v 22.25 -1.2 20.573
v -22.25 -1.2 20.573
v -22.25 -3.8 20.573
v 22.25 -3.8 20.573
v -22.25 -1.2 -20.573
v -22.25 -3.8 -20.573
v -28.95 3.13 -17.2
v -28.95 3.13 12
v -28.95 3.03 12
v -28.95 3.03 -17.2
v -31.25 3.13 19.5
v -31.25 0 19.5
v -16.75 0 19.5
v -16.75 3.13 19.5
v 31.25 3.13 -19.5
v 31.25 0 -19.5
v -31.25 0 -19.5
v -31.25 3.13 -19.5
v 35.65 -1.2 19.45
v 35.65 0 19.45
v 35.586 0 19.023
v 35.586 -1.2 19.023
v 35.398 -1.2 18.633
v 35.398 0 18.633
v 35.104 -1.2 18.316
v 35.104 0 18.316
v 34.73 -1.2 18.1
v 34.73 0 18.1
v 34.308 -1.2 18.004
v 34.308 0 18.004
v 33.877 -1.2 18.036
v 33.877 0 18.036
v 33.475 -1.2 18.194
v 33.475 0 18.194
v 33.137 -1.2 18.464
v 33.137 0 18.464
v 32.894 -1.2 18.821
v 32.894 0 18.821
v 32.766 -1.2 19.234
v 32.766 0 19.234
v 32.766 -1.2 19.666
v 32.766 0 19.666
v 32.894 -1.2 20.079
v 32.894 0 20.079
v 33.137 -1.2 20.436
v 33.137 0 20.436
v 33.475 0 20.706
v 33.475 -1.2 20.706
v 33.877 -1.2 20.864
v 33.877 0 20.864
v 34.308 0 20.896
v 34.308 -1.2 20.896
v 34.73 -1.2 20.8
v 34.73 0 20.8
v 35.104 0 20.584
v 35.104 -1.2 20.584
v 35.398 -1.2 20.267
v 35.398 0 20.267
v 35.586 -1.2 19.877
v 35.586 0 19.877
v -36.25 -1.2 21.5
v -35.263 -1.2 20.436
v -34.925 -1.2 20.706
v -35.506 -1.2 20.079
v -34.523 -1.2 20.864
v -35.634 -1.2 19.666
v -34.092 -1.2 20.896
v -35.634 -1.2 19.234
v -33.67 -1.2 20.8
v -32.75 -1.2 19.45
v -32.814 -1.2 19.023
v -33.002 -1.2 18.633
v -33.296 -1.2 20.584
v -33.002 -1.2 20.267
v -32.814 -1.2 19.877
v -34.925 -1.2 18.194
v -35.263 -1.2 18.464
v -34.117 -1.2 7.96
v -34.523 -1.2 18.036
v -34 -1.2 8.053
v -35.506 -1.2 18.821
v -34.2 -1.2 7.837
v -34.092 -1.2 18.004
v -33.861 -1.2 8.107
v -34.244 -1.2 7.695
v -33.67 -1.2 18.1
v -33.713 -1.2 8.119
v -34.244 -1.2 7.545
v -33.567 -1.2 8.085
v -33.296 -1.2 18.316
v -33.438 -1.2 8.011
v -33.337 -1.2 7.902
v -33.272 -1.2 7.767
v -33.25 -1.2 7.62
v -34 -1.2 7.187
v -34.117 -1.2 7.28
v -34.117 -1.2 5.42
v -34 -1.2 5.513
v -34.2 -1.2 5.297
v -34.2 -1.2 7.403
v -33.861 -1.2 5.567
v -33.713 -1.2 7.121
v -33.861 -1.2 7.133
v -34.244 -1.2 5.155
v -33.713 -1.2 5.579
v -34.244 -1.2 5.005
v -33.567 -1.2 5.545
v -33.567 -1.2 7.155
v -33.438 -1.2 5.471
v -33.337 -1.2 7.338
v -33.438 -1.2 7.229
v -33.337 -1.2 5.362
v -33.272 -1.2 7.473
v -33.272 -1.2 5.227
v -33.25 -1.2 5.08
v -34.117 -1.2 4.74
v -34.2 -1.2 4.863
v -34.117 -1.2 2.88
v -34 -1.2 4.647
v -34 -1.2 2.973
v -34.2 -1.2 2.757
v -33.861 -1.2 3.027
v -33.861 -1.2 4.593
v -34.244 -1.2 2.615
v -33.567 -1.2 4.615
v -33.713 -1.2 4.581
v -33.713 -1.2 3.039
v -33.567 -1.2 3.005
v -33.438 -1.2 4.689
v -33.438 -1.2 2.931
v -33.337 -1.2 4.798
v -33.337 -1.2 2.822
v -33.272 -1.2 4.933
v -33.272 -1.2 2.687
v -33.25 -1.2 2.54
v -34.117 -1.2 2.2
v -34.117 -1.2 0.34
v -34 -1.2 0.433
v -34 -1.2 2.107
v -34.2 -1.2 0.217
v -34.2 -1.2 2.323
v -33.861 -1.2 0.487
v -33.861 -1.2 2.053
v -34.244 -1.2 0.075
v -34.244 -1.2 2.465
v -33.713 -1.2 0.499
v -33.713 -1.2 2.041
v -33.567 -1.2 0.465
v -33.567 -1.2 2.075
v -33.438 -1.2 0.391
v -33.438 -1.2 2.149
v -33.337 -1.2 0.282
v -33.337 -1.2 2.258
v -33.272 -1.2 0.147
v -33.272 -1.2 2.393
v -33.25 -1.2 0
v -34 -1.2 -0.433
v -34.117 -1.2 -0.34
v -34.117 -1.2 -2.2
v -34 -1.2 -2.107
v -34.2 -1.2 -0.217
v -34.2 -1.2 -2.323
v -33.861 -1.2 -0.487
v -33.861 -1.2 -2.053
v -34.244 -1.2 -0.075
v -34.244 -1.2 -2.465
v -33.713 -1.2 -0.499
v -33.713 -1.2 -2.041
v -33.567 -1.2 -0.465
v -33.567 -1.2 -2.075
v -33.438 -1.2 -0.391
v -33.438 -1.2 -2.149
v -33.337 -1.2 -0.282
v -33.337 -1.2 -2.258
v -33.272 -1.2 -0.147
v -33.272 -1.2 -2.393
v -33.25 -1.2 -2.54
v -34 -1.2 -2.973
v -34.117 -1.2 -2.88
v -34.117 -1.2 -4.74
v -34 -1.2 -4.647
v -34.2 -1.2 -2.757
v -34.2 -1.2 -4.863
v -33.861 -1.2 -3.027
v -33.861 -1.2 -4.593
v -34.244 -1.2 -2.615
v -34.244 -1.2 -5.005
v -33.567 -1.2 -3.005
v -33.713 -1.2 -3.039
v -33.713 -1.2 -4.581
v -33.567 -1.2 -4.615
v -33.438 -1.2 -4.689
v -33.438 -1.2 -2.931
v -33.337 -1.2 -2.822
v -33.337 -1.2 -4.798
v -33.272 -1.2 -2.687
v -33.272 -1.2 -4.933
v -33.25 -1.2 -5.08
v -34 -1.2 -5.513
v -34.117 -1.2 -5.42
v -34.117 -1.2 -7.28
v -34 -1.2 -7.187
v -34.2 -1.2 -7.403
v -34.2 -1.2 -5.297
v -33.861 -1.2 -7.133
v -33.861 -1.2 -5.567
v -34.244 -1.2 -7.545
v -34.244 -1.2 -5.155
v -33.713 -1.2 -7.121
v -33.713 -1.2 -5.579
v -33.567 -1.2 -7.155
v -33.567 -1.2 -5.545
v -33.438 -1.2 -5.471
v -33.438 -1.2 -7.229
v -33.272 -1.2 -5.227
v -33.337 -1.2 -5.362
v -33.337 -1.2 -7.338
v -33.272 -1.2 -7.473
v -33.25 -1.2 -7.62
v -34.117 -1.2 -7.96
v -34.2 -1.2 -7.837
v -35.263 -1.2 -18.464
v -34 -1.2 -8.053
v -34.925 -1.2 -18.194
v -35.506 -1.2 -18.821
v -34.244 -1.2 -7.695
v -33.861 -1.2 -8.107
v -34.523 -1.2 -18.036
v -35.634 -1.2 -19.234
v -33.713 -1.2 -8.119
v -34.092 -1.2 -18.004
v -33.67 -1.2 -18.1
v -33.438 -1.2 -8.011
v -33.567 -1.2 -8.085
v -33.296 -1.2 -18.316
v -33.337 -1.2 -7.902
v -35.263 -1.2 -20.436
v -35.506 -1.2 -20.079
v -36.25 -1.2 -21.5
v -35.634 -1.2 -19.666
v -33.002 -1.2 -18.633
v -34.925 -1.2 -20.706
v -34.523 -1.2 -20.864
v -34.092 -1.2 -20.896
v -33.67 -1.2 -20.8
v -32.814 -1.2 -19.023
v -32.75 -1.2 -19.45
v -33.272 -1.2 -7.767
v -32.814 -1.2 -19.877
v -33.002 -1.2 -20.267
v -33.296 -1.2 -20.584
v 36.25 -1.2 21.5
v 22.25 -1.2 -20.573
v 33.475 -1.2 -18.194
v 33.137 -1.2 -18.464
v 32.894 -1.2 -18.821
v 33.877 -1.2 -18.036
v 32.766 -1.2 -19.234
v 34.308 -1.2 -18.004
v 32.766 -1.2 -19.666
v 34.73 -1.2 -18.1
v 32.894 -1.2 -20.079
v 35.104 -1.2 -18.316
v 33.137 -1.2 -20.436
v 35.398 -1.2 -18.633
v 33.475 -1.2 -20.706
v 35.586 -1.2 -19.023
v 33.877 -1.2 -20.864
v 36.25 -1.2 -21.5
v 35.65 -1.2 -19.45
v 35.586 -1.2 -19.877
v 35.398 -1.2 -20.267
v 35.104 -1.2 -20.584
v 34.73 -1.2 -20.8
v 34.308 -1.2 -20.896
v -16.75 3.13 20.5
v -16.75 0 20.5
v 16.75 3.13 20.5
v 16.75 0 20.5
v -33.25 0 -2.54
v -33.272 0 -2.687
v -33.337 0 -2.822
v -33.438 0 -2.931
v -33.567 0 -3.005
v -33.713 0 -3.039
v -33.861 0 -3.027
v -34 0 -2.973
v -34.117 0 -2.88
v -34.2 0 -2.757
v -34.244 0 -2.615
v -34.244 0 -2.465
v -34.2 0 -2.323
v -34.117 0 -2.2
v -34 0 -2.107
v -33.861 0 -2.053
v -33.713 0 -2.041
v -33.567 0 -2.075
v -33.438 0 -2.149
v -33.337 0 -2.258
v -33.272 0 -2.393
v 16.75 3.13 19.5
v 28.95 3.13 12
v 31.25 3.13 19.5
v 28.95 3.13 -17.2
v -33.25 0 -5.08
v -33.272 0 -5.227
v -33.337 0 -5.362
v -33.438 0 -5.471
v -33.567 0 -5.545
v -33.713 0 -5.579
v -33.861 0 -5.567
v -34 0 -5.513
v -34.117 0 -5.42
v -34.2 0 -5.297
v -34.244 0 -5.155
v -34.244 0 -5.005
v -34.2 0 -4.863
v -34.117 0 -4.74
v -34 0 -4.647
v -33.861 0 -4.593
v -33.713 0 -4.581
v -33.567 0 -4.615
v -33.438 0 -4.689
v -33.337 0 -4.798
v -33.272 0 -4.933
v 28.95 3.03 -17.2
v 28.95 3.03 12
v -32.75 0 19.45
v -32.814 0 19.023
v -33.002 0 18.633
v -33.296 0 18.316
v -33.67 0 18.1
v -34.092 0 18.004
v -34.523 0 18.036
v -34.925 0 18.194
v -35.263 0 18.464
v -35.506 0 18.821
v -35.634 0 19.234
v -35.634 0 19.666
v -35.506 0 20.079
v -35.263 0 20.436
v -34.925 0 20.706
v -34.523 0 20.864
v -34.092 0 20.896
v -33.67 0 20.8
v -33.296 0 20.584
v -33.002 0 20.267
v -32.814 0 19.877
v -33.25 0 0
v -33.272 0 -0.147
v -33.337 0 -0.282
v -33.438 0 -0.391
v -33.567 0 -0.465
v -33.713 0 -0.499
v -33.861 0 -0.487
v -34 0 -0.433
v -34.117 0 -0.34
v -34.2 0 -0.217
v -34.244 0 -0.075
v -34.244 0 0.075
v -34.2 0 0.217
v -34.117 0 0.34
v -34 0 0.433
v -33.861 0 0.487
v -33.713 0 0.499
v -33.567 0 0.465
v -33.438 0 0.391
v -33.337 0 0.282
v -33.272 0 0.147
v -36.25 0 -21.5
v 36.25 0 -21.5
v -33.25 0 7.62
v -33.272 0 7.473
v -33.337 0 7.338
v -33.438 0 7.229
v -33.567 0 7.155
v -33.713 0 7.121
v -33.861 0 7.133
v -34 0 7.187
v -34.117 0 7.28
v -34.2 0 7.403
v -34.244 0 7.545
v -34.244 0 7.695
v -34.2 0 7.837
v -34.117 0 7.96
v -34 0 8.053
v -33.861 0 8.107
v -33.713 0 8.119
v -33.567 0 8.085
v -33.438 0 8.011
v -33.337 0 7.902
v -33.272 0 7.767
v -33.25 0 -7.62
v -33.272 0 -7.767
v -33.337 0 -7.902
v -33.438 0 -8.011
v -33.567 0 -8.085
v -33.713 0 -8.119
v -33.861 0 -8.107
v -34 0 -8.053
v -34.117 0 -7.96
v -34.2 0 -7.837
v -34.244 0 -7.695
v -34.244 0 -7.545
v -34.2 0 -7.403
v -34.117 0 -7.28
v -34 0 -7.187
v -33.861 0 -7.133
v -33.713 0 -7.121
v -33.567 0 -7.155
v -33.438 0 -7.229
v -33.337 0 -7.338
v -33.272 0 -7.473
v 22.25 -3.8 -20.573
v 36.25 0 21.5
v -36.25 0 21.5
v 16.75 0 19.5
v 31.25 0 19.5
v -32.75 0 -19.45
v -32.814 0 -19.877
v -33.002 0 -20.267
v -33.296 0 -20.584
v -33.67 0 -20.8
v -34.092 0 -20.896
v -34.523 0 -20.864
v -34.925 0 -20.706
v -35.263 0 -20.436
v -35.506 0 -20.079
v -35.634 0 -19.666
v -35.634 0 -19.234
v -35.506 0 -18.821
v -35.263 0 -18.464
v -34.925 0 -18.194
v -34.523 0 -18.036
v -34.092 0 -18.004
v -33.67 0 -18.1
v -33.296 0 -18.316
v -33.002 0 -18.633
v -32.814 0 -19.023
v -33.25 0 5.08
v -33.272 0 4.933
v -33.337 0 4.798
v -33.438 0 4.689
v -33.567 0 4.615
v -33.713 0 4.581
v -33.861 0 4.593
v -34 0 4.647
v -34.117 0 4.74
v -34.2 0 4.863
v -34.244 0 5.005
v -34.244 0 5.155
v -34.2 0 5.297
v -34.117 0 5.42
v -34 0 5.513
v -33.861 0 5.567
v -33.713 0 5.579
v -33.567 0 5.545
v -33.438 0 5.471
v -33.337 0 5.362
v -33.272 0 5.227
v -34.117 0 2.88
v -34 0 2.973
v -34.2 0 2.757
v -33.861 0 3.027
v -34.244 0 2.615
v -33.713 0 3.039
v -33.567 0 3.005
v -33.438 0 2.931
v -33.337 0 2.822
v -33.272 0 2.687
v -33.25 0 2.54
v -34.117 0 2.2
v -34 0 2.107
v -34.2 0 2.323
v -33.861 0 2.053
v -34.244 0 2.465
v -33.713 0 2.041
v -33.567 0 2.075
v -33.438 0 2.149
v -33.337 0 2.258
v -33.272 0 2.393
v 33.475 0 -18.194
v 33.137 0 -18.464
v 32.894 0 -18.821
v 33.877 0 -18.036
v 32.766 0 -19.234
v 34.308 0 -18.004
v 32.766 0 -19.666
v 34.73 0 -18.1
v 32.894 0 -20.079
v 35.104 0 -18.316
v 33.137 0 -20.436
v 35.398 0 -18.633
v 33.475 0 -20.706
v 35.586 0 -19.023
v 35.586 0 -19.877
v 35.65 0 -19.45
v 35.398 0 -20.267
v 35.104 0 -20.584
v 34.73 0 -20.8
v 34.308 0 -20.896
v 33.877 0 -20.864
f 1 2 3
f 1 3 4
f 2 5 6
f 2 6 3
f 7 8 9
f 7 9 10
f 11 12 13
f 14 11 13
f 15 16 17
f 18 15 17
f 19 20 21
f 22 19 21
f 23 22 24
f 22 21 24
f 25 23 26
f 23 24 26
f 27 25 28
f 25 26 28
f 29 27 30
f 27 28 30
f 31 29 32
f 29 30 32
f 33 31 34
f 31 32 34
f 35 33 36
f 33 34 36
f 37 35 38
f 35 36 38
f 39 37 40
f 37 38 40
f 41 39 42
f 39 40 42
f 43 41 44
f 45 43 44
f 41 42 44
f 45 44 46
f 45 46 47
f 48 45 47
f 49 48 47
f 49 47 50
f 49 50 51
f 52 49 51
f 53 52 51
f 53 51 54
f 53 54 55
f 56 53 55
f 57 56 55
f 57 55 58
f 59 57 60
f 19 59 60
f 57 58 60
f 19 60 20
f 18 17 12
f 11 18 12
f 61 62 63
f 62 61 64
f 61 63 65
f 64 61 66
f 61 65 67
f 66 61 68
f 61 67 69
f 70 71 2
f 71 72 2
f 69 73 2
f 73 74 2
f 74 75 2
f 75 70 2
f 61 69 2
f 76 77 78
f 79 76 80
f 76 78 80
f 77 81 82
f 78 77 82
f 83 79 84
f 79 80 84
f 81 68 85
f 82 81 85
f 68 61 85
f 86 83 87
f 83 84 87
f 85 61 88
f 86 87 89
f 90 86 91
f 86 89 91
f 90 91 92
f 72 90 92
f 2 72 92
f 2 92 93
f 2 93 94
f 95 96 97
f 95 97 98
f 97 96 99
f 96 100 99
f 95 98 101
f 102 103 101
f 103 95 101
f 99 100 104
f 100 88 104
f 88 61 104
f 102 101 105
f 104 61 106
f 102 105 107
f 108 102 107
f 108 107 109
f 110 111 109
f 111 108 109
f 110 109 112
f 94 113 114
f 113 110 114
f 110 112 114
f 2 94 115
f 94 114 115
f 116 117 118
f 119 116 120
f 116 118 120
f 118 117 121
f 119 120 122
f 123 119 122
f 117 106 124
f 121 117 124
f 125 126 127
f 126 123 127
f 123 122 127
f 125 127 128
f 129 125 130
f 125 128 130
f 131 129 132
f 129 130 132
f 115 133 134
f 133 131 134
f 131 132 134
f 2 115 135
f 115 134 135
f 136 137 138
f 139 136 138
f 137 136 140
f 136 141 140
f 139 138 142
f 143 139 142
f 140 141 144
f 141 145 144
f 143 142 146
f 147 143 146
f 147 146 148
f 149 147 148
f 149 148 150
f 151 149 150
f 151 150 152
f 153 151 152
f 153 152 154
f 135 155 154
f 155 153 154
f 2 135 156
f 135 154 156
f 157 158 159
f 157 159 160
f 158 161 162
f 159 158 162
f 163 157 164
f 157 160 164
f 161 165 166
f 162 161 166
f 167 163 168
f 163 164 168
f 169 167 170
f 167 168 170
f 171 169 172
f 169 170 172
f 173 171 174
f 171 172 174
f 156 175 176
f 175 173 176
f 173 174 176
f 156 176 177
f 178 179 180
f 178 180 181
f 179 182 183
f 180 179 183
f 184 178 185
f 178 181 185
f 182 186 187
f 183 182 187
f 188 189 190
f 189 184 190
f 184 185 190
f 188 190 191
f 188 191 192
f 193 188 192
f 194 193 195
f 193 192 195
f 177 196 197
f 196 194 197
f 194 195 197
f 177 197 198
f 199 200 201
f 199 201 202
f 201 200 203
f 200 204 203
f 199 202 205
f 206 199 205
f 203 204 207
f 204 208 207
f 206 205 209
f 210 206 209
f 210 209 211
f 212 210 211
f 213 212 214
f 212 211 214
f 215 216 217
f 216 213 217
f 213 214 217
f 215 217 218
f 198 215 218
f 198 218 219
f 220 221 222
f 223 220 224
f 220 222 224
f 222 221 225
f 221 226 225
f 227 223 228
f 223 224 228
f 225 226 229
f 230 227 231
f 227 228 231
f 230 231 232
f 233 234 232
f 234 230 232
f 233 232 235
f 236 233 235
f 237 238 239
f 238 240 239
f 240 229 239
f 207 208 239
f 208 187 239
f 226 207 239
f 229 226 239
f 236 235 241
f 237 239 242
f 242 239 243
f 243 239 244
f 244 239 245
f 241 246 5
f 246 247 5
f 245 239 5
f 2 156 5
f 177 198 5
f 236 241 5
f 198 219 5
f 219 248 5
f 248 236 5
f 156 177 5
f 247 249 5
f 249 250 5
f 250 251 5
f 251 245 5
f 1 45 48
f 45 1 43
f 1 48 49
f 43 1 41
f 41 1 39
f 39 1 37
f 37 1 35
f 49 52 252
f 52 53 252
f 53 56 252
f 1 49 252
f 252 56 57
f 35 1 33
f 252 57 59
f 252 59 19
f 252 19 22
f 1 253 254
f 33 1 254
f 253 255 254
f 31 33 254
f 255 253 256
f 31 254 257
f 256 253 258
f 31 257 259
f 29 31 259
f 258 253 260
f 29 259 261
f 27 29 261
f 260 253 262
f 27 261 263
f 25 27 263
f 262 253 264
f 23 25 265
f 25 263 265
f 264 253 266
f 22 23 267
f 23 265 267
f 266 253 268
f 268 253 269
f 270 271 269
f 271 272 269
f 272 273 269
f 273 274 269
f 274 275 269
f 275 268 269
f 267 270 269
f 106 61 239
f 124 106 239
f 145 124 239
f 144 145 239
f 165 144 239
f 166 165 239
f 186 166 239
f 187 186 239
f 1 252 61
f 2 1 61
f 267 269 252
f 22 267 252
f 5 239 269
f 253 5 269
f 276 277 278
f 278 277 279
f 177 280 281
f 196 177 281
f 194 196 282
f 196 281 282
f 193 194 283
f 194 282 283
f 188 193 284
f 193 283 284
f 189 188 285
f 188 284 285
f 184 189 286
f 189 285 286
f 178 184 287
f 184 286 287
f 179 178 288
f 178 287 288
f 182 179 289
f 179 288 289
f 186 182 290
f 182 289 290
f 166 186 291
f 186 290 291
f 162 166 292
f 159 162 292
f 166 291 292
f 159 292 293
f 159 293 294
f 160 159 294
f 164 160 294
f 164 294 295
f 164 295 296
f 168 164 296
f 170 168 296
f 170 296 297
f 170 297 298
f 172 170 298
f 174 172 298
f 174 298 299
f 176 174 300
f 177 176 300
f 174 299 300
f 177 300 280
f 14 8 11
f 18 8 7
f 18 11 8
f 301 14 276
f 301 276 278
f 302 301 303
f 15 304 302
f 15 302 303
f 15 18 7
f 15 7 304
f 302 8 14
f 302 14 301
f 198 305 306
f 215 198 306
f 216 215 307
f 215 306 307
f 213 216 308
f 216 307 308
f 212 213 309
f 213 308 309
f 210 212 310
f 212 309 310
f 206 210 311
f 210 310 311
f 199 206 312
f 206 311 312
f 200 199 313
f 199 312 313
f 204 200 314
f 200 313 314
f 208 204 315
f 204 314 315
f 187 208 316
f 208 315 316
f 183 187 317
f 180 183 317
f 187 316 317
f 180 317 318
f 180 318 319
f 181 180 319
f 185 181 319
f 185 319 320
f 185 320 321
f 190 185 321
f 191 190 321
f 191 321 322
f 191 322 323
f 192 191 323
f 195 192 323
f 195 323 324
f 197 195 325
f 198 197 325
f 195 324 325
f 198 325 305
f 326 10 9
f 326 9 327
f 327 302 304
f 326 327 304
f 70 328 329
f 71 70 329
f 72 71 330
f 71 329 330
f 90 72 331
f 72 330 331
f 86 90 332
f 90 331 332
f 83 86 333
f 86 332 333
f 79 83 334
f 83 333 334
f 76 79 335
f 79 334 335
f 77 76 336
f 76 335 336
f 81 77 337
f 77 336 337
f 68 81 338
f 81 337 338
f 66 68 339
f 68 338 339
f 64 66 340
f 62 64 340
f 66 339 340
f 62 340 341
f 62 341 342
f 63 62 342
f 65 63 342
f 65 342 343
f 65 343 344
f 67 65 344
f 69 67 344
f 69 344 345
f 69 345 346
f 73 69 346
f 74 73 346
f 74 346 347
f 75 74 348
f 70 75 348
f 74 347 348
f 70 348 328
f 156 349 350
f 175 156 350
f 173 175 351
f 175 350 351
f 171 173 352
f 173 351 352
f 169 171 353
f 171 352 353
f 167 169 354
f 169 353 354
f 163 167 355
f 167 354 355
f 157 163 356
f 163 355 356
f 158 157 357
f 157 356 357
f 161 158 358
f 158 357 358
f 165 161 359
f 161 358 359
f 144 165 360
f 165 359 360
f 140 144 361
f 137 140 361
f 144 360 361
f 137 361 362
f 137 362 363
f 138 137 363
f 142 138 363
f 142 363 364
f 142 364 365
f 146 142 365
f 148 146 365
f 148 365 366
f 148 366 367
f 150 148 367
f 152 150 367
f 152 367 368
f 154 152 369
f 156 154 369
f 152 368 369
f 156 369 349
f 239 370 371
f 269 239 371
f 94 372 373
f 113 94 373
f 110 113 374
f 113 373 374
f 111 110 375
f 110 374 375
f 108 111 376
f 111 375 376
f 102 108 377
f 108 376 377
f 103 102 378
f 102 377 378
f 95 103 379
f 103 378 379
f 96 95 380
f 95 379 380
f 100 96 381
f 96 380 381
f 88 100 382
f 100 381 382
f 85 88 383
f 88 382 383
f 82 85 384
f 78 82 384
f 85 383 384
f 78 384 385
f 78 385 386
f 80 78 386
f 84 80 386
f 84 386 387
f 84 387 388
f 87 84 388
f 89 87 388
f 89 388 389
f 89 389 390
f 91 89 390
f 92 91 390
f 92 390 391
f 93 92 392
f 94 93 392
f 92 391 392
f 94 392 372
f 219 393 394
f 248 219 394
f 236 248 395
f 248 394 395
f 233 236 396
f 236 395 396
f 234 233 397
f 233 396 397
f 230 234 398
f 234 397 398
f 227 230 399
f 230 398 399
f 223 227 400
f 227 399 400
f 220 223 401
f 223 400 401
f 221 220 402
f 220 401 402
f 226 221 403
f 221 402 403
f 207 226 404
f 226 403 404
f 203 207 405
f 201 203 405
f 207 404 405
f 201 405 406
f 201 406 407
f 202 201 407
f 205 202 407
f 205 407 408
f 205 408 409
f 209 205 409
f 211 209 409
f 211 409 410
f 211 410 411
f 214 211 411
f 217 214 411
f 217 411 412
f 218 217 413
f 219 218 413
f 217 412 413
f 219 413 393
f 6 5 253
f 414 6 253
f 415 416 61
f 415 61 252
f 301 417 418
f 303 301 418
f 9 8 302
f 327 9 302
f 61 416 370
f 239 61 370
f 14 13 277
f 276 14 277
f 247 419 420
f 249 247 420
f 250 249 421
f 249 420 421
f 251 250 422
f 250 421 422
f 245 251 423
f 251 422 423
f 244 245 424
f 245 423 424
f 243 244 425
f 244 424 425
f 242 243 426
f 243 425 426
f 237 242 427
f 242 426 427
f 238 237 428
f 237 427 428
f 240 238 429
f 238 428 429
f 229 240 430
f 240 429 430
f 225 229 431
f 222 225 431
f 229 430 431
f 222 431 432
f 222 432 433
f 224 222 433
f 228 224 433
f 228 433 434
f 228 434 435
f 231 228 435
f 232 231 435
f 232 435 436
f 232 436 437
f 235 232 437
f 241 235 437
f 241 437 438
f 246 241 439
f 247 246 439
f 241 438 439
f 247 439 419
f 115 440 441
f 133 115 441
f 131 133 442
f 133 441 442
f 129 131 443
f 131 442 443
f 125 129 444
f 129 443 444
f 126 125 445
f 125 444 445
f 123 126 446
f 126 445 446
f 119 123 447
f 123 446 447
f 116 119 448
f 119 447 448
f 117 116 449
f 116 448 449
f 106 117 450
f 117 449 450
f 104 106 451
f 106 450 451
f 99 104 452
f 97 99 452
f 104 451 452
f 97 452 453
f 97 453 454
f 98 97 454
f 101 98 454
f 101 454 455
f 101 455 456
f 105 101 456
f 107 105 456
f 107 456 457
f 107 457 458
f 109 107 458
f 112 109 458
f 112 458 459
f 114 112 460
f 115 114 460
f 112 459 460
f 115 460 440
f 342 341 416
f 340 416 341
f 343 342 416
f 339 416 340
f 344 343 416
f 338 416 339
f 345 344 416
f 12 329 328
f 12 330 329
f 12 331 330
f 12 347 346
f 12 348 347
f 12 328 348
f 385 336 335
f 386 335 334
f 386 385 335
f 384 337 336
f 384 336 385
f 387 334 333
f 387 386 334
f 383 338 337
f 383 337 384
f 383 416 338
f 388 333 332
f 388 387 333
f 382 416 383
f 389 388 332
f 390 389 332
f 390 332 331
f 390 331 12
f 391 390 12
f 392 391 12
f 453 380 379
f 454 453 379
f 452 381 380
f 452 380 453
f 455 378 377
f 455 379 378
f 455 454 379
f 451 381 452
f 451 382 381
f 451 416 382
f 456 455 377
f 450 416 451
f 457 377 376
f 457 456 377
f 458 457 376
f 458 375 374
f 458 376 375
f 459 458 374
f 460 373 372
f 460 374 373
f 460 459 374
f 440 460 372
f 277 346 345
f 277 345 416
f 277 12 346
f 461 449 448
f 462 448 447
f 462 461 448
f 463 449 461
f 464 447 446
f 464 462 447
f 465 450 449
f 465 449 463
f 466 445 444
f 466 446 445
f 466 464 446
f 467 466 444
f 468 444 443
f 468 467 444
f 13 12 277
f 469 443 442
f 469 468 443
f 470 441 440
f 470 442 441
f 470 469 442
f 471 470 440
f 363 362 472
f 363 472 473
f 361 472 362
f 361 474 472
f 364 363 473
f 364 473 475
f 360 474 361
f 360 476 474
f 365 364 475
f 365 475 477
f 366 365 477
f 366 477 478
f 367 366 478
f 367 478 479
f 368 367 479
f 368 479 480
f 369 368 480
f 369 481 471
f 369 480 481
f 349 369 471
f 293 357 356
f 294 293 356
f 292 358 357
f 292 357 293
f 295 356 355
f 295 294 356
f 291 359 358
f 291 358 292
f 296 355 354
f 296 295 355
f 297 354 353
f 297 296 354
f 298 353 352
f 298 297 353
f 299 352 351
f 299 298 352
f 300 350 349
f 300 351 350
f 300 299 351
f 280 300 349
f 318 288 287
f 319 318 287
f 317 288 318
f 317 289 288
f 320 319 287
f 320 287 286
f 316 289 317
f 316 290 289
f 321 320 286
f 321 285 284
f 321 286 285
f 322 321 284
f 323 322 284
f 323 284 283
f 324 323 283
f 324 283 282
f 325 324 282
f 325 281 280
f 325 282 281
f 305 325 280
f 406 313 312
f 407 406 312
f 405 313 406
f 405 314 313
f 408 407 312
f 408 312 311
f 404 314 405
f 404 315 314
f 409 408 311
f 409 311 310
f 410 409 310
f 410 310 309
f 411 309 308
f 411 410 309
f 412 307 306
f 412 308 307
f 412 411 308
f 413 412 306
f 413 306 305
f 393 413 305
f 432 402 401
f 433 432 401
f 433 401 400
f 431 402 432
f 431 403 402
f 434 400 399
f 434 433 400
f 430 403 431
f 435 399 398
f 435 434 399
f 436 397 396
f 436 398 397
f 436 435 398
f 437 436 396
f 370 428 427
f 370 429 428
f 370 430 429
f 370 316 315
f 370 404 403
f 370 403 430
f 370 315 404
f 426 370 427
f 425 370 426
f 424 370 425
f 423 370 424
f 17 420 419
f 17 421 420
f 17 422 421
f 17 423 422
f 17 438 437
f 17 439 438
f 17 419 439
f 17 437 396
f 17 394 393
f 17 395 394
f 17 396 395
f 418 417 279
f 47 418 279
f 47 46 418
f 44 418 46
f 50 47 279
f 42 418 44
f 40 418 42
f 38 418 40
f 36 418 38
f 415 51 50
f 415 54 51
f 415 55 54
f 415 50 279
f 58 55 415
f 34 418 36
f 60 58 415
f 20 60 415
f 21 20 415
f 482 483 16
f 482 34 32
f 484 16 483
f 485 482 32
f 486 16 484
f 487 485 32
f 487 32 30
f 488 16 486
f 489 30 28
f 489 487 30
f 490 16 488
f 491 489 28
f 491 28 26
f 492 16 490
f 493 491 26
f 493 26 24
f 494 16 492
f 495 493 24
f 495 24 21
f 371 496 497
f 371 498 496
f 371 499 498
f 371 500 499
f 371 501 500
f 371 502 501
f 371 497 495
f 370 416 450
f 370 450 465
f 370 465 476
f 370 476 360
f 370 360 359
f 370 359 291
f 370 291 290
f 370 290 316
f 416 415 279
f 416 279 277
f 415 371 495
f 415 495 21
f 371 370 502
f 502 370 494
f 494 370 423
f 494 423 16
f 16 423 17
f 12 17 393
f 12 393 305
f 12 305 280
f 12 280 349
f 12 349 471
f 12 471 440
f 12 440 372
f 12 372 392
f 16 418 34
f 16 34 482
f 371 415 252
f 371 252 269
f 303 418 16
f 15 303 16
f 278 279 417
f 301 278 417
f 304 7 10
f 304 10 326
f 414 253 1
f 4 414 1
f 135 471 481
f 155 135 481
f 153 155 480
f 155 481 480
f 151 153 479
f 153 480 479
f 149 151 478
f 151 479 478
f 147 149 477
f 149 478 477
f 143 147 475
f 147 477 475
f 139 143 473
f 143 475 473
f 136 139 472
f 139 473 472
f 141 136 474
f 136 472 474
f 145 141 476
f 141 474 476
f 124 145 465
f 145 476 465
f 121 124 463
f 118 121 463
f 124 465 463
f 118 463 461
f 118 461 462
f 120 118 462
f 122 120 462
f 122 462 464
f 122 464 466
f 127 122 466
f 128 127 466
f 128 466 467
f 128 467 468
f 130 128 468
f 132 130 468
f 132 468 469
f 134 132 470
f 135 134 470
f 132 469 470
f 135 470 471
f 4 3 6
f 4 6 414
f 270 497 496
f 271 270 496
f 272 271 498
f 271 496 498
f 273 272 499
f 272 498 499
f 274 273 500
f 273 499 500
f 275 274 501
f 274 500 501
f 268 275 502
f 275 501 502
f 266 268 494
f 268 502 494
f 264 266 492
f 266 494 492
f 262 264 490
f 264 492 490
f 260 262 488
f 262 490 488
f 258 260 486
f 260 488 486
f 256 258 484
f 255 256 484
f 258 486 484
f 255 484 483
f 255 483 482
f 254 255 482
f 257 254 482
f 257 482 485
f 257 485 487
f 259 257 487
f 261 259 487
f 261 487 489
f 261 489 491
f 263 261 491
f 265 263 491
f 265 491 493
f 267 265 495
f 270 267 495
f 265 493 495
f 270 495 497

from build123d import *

# Parameters (mm, degrees)
SKETCH1_W           = 72.5
SKETCH1_H           = 43
SKETCH1_R           = 1.45
SKETCH1_R_2         = 0.5
BOSS_EXTRUDE1_DEPTH = 1.2
SKETCH2_W           = 44.5
SKETCH2_H           = 41.146019014
BOSS_EXTRUDE2_DEPTH = 2.6
BOSS_EXTRUDE3_DEPTH = 3.13
SKETCH4_W           = 57.9
SKETCH4_H           = 29.2
CUT_EXTRUDE1_DEPTH  = 0.1


with BuildPart() as part:
    # Sketch1 → Boss-Extrude1 (new body)
    with BuildSketch(Plane(origin=(0, 0, 0), x_dir=(1, 0, 0), z_dir=(0, 1, 0))):
        Rectangle(SKETCH1_W, SKETCH1_H)
        with Locations((-34.2, 19.45)):
            Circle(SKETCH1_R, mode=Mode.SUBTRACT)
        with Locations((-33.75, 7.62)):
            Circle(SKETCH1_R_2, mode=Mode.SUBTRACT)
        with Locations((-33.75, 5.08)):
            Circle(SKETCH1_R_2, mode=Mode.SUBTRACT)
        with Locations((-33.75, 2.54)):
            Circle(SKETCH1_R_2, mode=Mode.SUBTRACT)
        with Locations((-33.75, 0)):
            Circle(SKETCH1_R_2, mode=Mode.SUBTRACT)
        with Locations((-33.75, -2.54)):
            Circle(SKETCH1_R_2, mode=Mode.SUBTRACT)
        with Locations((-33.75, -5.08)):
            Circle(SKETCH1_R_2, mode=Mode.SUBTRACT)
        with Locations((-33.75, -7.62)):
            Circle(SKETCH1_R_2, mode=Mode.SUBTRACT)
        with Locations((-34.2, -19.45)):
            Circle(SKETCH1_R, mode=Mode.SUBTRACT)
        with Locations((34.2, 19.45)):
            Circle(SKETCH1_R, mode=Mode.SUBTRACT)
        with Locations((34.2, -19.45)):
            Circle(SKETCH1_R, mode=Mode.SUBTRACT)
    extrude(amount=-BOSS_EXTRUDE1_DEPTH)

    # Sketch2 → Boss-Extrude2 (add)
    with BuildSketch(Plane.XZ.offset(1.2)):
        Rectangle(SKETCH2_W, SKETCH2_H)
    extrude(amount=BOSS_EXTRUDE2_DEPTH)

    # Sketch3 → Boss-Extrude3 (add)
    with BuildSketch(Plane(origin=(0, 0, 0), x_dir=(1, 0, 0), z_dir=(0, 1, 0))):
        Polygon((-16.75, -19.5), (-16.75, -20.5), (16.75, -20.5), (16.75, -19.5), (31.25, -19.5), (31.25, 19.5), (-31.25, 19.5), (-31.25, -19.5), align=None)
    extrude(amount=BOSS_EXTRUDE3_DEPTH)

    # Sketch4 → Cut-Extrude1 (cut)
    with BuildSketch(Plane(origin=(0, 3.13, 0), x_dir=(1, 0, 0), z_dir=(0, 1, 0))):
        with Locations((0, 2.6)):
            Rectangle(SKETCH4_W, SKETCH4_H)
    extrude(amount=-CUT_EXTRUDE1_DEPTH, mode=Mode.SUBTRACT)


solid = part.part
